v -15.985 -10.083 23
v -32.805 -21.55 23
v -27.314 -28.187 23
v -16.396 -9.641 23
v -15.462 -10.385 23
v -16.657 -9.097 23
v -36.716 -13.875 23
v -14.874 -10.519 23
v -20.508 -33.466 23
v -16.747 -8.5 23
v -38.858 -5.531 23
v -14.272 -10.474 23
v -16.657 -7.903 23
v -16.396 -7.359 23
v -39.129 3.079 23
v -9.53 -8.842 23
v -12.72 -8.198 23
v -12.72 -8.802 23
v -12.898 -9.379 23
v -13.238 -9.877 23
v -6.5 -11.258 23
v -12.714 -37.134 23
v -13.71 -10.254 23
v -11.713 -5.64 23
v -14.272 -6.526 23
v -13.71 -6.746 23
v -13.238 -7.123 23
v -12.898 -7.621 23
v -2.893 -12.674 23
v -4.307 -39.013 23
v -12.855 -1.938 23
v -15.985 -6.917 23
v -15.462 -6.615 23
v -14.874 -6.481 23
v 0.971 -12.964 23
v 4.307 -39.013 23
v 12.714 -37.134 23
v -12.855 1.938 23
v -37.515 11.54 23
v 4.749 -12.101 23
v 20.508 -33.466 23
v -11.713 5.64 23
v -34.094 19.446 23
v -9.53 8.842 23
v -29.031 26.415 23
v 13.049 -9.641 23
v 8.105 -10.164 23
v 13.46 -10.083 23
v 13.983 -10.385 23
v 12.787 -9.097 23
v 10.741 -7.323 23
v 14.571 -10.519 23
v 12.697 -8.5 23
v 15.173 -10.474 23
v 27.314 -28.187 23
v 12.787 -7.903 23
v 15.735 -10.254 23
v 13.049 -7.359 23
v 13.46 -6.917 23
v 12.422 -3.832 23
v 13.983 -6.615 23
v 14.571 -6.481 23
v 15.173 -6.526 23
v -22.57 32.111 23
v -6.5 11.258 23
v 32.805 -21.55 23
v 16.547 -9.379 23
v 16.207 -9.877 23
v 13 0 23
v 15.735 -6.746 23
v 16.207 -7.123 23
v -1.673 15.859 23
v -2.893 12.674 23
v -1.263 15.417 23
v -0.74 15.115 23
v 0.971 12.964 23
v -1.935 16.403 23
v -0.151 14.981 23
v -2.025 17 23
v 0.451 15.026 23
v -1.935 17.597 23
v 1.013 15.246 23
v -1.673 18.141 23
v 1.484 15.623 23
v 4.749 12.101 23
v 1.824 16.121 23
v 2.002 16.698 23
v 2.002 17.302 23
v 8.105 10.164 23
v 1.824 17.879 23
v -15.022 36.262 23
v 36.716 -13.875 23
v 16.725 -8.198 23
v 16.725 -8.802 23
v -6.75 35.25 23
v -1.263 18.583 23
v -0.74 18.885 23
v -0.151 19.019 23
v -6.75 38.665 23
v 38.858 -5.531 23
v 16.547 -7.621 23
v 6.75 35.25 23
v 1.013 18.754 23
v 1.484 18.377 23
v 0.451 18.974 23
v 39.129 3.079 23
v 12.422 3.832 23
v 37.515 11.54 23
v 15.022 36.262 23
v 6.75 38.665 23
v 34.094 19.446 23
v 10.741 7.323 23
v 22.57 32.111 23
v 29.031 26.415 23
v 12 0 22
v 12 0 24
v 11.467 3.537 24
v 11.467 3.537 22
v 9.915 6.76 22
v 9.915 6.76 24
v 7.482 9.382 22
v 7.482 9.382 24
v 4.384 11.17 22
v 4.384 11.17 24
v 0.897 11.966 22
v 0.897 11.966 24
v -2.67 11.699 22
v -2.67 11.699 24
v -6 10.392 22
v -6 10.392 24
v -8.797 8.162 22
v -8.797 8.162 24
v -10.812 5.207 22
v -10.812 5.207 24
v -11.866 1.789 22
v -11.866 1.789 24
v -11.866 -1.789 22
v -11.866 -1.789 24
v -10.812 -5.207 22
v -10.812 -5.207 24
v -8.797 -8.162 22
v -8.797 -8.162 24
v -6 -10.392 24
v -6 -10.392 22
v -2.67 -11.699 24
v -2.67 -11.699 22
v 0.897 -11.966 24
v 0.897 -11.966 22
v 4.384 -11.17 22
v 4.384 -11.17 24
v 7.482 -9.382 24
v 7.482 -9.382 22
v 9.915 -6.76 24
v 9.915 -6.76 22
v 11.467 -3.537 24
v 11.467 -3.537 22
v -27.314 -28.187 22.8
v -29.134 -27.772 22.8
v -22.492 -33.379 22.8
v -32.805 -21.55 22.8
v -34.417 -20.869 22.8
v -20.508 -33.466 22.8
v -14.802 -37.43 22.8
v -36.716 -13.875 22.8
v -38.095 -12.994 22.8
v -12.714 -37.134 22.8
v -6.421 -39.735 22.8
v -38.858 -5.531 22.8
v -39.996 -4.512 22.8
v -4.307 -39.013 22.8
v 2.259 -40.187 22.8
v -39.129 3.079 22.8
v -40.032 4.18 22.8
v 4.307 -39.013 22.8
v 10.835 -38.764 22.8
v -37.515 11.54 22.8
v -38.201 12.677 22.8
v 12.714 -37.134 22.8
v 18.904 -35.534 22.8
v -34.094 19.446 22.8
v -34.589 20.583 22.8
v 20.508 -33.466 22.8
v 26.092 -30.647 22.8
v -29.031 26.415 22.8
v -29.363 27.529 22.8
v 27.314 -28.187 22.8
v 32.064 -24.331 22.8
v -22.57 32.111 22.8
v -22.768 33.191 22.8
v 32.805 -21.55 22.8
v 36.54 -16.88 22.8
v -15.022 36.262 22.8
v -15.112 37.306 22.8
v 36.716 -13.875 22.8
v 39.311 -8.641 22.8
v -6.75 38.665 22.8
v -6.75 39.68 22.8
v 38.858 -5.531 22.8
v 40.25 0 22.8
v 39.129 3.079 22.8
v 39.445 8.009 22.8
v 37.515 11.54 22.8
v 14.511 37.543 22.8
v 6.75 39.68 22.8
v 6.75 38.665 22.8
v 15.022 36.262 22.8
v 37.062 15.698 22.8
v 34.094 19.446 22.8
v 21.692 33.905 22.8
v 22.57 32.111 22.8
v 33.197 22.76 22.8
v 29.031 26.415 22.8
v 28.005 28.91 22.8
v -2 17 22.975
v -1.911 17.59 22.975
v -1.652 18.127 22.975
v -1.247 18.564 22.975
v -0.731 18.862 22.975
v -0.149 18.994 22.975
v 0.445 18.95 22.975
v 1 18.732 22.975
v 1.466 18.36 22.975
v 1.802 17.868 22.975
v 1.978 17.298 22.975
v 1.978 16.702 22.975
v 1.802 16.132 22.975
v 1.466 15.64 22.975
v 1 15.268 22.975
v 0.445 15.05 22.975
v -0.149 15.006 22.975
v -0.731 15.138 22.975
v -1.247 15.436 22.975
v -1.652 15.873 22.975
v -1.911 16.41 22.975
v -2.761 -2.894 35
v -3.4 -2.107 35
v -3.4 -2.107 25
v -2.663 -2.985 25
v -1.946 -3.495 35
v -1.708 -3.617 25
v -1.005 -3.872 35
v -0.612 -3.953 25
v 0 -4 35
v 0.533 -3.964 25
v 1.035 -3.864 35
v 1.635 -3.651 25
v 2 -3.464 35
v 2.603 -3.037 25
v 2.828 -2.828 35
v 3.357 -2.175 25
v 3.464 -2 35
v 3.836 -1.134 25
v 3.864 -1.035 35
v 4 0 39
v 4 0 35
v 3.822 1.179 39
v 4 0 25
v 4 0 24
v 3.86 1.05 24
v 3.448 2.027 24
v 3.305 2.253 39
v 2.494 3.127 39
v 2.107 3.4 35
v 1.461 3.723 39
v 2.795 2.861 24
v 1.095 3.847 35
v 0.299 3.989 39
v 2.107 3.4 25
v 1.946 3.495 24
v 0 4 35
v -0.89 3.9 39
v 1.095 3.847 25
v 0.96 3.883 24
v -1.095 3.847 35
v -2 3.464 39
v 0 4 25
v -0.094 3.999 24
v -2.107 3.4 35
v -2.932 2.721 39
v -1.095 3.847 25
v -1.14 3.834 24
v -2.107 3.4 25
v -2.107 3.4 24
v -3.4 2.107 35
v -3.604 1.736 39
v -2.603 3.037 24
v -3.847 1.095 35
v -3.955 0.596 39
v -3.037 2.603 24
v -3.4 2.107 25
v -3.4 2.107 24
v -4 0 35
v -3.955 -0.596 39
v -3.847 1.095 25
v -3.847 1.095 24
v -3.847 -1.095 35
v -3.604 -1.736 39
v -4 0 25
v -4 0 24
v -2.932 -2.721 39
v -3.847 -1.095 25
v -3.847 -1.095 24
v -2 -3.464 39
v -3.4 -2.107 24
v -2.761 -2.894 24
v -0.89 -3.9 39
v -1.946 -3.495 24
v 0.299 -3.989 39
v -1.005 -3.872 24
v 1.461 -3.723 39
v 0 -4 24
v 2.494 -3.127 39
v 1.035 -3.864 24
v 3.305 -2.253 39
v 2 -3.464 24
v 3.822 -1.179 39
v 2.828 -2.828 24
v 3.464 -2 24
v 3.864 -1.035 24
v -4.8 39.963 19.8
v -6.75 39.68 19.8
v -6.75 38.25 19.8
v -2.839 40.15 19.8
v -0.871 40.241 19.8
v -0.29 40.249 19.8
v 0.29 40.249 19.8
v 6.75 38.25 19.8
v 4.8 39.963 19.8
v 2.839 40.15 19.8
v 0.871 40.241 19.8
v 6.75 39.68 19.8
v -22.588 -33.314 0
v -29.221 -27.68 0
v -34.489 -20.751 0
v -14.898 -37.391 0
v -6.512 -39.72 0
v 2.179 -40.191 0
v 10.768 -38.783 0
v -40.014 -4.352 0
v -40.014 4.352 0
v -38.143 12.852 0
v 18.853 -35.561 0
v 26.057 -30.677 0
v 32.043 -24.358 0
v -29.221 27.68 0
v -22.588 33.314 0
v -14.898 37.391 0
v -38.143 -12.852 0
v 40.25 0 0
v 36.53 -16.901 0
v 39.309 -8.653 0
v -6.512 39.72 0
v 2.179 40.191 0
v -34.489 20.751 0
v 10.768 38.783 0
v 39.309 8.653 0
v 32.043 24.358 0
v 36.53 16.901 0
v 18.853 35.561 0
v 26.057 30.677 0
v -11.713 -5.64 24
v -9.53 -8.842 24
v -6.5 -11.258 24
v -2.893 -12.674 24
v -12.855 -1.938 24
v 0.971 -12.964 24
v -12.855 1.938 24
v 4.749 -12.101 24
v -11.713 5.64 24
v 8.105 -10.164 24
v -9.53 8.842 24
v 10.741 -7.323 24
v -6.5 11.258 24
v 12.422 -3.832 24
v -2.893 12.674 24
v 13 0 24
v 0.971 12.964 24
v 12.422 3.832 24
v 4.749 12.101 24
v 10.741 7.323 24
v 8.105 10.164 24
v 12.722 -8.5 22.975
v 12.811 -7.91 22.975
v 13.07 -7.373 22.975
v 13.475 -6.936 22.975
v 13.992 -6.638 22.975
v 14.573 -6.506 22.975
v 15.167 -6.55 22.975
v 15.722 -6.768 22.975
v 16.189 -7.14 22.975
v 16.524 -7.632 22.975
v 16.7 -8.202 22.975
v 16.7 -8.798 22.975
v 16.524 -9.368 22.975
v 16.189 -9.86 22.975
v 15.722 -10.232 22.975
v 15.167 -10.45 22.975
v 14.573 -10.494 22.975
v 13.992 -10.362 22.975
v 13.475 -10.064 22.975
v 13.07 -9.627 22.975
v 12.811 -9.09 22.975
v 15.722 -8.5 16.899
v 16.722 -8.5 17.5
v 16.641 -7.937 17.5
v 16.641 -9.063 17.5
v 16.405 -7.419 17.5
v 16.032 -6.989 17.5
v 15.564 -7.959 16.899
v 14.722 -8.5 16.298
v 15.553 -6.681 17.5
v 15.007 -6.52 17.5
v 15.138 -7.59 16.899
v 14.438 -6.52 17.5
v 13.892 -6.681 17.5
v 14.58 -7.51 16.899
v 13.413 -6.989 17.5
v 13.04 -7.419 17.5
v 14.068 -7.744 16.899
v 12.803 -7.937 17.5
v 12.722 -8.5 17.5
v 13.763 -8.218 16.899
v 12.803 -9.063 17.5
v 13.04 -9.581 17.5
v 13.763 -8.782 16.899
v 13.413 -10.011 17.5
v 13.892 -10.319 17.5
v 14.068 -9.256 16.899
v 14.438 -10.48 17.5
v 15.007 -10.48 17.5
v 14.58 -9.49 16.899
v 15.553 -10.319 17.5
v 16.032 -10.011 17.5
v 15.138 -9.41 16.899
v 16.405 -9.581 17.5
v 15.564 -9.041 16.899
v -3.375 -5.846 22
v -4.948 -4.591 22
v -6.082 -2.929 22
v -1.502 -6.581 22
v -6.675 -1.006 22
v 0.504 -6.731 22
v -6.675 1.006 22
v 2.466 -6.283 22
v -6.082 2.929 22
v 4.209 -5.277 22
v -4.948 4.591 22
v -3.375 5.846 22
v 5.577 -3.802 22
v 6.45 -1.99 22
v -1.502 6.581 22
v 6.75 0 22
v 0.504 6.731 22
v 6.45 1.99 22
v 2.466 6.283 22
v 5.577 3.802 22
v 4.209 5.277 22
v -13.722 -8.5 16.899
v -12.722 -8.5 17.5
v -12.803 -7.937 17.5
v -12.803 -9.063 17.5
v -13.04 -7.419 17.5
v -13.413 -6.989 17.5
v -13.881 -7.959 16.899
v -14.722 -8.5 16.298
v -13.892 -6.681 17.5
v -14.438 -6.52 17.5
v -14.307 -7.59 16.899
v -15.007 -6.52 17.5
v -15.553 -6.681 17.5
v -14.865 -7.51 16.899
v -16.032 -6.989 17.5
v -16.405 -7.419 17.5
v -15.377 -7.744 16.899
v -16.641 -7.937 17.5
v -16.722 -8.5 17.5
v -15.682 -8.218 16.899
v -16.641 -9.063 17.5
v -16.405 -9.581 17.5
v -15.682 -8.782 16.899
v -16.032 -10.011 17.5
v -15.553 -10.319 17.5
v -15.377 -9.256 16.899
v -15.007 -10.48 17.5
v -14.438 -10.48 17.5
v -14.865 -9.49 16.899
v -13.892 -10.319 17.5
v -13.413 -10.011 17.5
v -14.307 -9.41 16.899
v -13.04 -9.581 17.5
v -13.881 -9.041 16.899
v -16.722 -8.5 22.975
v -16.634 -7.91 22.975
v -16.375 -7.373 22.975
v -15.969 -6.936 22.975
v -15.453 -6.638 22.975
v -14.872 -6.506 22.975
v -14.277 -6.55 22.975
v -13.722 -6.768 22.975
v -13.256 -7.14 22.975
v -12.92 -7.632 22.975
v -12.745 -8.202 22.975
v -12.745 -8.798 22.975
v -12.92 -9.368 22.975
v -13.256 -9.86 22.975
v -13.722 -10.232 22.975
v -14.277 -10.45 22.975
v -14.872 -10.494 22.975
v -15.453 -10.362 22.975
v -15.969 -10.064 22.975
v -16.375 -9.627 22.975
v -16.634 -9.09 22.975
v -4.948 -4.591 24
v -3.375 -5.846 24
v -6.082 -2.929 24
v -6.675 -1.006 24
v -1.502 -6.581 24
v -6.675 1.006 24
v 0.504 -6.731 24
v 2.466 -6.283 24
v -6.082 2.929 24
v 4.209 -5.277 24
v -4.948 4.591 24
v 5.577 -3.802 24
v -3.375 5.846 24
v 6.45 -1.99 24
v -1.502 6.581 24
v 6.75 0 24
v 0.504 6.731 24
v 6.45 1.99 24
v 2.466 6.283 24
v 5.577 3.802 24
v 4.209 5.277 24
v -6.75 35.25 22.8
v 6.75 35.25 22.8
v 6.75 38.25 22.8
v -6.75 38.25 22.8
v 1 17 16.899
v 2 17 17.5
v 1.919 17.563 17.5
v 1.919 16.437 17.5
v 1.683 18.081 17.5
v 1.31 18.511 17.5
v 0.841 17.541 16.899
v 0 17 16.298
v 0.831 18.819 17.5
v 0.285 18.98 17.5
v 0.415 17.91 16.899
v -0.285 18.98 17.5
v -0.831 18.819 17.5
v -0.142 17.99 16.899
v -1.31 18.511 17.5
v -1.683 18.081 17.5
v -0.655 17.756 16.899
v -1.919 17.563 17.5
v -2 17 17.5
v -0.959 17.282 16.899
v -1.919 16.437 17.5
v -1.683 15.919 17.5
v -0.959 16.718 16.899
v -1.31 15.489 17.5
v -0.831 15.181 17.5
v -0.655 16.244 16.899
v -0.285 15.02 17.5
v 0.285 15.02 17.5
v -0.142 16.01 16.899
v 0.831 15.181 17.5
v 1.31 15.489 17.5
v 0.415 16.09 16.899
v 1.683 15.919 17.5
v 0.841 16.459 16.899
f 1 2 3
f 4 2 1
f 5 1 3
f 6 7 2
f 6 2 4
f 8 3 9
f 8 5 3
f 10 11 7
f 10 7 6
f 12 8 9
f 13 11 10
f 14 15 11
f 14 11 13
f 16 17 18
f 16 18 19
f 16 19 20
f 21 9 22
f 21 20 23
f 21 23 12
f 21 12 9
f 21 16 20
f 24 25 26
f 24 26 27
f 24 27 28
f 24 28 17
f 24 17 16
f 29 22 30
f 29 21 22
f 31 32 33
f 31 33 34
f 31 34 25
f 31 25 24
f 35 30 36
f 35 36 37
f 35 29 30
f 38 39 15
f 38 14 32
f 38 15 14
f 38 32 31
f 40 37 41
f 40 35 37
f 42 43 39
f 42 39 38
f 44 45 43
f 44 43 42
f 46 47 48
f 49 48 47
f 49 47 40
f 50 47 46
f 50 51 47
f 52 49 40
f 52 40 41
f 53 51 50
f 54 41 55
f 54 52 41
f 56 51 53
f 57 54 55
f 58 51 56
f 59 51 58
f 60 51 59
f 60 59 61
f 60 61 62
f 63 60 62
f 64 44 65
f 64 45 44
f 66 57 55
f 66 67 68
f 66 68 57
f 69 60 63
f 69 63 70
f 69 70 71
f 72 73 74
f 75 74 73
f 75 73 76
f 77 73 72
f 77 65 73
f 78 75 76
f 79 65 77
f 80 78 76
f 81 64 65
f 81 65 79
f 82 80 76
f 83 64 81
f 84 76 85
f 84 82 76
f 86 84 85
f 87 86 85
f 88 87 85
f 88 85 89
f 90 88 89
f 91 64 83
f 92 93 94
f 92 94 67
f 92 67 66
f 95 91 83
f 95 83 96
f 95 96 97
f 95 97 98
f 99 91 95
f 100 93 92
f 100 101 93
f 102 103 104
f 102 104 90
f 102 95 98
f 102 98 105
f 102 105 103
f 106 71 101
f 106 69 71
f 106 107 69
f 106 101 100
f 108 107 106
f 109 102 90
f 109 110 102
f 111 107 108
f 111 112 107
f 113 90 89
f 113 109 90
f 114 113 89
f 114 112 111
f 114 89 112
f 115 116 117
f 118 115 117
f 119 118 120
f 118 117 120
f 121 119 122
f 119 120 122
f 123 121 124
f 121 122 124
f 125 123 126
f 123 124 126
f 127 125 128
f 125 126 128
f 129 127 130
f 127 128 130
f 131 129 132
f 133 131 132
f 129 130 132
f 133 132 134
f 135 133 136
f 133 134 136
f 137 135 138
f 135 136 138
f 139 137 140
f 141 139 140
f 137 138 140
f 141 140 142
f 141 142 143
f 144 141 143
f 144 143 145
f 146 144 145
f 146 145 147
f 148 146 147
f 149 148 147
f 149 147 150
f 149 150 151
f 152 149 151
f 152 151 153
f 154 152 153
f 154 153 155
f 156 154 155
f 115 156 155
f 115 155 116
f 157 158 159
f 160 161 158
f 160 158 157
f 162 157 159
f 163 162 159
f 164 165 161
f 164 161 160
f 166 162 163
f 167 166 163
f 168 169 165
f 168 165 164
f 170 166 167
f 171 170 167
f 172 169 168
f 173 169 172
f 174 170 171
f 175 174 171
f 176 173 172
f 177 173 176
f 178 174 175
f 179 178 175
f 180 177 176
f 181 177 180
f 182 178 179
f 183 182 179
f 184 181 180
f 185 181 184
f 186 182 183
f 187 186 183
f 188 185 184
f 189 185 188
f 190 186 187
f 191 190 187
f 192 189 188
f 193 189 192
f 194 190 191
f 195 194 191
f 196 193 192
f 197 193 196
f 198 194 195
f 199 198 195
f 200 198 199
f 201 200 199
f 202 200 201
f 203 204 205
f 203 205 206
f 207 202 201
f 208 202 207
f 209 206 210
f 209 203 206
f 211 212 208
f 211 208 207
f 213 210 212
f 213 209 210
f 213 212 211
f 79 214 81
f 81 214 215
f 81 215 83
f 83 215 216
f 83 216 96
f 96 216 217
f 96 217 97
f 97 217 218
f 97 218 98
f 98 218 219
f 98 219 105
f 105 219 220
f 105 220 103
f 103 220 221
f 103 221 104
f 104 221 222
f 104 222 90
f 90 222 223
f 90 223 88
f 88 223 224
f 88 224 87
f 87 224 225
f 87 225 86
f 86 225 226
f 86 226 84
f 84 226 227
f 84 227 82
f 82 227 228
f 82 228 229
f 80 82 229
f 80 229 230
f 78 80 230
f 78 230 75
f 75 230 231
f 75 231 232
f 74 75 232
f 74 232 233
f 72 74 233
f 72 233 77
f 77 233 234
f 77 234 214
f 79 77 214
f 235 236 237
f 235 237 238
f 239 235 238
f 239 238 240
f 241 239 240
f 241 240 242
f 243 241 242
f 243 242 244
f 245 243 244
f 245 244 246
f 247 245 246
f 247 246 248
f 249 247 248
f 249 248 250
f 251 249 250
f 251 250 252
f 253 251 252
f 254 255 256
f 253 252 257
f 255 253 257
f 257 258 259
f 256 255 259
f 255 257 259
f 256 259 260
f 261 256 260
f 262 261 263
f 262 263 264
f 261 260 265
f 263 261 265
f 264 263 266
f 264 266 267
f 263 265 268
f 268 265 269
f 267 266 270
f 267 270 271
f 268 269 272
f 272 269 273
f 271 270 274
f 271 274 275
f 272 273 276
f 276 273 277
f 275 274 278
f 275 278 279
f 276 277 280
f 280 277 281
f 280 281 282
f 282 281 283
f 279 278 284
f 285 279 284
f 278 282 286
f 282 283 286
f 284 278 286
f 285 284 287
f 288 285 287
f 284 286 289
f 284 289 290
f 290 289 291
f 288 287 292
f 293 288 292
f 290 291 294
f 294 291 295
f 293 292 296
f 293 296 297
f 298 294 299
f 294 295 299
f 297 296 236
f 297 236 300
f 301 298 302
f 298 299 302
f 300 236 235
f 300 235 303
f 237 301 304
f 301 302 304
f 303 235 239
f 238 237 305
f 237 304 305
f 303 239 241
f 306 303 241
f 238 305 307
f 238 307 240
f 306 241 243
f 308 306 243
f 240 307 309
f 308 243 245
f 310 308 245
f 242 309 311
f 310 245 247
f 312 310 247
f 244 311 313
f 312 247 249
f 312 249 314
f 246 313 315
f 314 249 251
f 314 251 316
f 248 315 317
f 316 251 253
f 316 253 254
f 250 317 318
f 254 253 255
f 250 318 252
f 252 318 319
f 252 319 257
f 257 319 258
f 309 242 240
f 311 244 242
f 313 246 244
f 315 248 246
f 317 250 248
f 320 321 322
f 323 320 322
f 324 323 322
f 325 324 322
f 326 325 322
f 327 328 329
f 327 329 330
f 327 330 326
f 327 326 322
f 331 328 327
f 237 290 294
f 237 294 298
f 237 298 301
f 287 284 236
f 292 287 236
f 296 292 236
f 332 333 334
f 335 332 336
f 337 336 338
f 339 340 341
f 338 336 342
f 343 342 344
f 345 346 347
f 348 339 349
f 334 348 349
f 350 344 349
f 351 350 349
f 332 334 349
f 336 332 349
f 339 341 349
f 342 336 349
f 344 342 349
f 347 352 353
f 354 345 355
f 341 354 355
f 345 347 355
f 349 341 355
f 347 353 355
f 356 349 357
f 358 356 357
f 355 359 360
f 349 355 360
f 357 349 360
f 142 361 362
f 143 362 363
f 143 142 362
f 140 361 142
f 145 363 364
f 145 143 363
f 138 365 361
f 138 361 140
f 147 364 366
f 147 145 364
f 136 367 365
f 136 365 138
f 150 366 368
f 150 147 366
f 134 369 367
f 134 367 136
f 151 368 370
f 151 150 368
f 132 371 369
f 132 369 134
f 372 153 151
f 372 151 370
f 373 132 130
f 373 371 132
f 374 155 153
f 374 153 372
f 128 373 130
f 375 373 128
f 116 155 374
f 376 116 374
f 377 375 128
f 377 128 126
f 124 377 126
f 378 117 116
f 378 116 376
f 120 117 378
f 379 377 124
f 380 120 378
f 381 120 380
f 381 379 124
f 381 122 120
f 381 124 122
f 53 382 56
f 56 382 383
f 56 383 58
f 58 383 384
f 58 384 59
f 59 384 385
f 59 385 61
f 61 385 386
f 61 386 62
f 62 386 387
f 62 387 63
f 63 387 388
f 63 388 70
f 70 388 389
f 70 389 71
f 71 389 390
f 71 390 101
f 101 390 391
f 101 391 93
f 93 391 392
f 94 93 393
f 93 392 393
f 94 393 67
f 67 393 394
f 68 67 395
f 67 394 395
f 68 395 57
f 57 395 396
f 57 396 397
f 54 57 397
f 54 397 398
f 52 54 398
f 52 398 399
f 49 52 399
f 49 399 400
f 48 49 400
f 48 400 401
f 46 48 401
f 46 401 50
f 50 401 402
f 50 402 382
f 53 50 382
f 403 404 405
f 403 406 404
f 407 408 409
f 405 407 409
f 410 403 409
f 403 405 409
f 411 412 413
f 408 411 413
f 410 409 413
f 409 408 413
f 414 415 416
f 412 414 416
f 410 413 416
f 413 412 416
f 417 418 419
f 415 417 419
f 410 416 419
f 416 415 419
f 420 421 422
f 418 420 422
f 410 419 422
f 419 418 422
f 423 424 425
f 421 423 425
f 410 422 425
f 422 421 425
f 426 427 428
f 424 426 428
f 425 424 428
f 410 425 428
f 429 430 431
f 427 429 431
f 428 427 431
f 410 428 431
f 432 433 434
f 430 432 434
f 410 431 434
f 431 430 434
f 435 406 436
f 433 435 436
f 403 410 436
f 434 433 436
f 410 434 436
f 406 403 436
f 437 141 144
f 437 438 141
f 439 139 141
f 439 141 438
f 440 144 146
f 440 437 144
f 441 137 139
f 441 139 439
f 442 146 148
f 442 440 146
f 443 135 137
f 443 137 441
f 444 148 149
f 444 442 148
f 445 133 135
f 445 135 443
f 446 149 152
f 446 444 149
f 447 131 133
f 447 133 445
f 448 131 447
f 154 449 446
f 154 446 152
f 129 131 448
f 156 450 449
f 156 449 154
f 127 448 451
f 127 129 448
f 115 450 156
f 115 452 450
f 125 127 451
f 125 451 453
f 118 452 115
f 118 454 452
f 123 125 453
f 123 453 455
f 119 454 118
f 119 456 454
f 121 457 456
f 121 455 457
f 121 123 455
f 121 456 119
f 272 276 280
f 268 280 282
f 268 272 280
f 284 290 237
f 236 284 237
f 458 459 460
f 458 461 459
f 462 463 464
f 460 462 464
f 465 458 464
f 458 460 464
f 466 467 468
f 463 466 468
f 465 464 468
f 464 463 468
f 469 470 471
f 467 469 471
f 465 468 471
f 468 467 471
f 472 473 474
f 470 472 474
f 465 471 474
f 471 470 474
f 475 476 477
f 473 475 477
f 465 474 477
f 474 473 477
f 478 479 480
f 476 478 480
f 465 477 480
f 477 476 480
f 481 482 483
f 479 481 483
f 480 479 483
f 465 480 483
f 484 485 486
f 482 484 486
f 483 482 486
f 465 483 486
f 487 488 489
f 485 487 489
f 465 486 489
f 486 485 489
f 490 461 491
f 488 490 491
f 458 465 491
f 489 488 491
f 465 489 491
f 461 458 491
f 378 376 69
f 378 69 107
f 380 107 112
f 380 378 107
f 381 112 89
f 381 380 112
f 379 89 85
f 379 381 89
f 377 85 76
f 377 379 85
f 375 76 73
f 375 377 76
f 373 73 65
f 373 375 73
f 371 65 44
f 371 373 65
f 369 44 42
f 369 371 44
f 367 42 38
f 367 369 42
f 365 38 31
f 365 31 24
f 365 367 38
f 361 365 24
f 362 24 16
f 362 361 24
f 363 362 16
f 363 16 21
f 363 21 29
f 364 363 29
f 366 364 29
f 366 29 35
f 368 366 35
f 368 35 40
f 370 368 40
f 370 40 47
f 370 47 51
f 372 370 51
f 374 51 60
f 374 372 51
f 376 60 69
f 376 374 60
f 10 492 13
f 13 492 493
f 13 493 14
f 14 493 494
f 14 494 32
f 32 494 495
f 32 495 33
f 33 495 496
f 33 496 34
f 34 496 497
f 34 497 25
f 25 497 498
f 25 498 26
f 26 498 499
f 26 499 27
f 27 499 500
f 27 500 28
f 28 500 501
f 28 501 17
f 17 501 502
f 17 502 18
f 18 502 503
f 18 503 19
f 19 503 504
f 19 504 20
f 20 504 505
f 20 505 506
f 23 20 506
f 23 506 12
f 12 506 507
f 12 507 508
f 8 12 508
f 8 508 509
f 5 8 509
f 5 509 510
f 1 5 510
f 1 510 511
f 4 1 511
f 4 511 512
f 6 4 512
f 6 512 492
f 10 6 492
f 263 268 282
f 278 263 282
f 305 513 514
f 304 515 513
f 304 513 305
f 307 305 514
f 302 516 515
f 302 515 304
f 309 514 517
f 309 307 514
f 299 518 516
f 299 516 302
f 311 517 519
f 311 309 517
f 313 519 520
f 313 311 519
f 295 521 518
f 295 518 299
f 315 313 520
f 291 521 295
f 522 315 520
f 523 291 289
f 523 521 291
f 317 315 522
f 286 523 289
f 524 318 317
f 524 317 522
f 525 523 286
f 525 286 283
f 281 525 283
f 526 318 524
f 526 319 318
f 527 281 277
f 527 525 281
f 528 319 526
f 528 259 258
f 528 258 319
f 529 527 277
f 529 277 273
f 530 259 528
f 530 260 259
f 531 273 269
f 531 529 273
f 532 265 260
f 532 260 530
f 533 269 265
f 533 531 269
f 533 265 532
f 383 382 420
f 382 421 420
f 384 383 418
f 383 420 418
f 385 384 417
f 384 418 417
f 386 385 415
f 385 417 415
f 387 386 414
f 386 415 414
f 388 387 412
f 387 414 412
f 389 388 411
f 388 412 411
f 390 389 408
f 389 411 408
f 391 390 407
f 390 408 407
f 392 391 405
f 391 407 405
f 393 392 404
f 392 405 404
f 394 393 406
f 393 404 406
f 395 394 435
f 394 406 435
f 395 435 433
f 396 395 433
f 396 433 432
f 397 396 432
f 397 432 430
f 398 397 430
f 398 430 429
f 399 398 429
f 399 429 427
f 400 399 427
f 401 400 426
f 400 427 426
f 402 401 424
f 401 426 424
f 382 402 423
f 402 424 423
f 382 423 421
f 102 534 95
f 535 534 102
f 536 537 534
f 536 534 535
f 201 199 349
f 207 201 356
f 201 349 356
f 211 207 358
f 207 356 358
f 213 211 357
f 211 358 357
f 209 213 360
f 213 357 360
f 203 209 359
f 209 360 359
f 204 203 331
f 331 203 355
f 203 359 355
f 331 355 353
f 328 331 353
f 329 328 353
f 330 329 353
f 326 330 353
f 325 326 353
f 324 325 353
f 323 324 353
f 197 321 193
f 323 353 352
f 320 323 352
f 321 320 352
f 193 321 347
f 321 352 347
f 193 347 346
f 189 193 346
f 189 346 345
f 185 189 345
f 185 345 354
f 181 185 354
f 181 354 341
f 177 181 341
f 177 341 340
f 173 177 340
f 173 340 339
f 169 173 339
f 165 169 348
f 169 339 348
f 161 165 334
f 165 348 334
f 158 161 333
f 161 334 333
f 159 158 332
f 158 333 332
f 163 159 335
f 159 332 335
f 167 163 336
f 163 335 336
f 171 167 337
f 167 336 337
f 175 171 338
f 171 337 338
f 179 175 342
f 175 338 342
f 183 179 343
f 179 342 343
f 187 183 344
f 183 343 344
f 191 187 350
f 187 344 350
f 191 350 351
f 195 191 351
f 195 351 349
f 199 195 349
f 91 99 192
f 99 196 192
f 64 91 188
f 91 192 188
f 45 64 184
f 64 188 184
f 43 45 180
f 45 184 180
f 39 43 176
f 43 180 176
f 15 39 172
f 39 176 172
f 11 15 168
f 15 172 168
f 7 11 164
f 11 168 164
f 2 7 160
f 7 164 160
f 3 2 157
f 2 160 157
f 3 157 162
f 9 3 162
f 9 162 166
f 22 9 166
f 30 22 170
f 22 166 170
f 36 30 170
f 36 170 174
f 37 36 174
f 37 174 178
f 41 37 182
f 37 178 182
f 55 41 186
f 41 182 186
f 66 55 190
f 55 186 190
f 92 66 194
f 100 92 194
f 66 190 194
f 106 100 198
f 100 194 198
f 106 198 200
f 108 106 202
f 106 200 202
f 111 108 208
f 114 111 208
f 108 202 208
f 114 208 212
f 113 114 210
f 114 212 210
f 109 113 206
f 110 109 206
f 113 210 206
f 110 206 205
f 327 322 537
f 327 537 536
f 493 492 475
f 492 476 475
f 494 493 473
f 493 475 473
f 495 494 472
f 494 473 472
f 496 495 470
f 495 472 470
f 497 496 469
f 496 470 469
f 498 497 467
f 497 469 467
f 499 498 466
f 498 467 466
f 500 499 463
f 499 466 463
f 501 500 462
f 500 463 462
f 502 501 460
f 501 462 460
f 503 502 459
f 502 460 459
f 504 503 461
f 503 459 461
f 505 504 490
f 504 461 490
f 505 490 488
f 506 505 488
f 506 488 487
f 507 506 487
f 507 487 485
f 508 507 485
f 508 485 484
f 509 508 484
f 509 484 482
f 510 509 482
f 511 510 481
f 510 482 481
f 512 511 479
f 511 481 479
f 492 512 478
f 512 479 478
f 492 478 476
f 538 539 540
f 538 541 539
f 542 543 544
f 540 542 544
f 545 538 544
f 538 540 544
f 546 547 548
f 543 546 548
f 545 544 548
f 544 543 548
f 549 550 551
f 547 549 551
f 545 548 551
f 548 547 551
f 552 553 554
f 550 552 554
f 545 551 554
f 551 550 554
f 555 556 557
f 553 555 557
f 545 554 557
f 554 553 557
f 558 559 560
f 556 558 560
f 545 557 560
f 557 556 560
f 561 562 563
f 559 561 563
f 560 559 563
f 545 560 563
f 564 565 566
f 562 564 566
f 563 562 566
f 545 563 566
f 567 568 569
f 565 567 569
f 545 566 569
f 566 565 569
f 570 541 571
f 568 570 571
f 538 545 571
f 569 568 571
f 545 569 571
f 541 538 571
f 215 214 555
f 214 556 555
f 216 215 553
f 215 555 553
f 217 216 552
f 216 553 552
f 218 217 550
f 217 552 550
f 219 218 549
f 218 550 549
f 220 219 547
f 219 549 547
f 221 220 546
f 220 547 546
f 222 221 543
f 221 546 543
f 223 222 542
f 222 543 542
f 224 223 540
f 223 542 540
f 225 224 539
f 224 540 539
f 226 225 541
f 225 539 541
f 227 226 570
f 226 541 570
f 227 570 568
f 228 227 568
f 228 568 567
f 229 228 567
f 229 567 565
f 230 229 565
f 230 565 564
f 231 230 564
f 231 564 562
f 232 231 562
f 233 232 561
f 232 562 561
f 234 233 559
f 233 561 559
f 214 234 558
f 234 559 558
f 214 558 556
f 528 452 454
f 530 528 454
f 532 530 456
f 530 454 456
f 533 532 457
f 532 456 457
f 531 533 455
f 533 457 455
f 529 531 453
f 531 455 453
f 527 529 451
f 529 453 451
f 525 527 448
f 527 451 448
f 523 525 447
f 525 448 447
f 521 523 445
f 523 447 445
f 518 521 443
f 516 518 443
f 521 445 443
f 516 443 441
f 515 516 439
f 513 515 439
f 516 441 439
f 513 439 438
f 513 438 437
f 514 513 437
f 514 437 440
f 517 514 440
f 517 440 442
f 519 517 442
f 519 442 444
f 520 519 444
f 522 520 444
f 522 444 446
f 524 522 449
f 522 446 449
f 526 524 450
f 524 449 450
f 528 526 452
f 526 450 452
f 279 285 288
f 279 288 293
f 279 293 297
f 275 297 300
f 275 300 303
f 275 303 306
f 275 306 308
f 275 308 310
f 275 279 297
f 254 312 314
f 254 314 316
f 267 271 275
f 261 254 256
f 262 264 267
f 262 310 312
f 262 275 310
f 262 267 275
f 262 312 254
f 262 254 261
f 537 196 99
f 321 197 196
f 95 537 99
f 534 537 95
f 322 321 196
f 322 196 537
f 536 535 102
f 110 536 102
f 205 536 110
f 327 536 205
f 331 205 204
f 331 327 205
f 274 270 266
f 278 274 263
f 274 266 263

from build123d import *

# Parameters (mm, degrees)
SKETCH1_R                       = 40.25
BOSS_EXTRUDE1_DEPTH             = 23
SKETCH2_R                       = 12
CUT_EXTRUDE1_DEPTH              = 1
BOSS_EXTRUDE2_START             = 1
SKETCH3_R                       = 13
SKETCH3_R_2                     = 12
BOSS_EXTRUDE2_DEPTH             = 1
SKETCH4_R                       = 6.75
BOSS_EXTRUDE3_DEPTH             = 2
SKETCH7_R                       = 4
BOSS_EXTRUDE5_DEPTH             = 1
BOSS_EXTRUDE6_DEPTH             = 11
SKETCH8_R                       = 4
BOSS_EXTRUDE7_DEPTH             = 4
CUT_EXTRUDE2_START              = -0.2
SKETCH9_R                       = 40.25
SKETCH9_R_2                     = 39.25
CUT_EXTRUDE2_DEPTH              = 0.2
CUT_EXTRUDE4_START              = -0.2
CUT_EXTRUDE4_DEPTH              = 0.2
CUT_EXTRUDE5_START              = -3
CUT_EXTRUDE5_DEPTH              = 3
F_4_0MM_DOWEL_HOLE1_D           = 4
F_4_0MM_DOWEL_HOLE1_DEPTH       = 5.5
F_4_0MM_DOWEL_HOLE1_CSINK_D     = 4.05
F_4_0MM_DOWEL_HOLE1_CSINK_ANGLE = 90
F_4_0MM_DOWEL_HOLE1_TIP         = 1.201721238


with BuildPart() as part:
    # Sketch1 → Boss-Extrude1 (new body)
    with BuildSketch(Plane.XY):
        Circle(SKETCH1_R)
    extrude(amount=BOSS_EXTRUDE1_DEPTH)

    # Sketch2 → Cut-Extrude1 (cut)
    with BuildSketch(Plane.XY.offset(23)):
        Circle(SKETCH2_R)
    extrude(amount=-CUT_EXTRUDE1_DEPTH, mode=Mode.SUBTRACT)

    # Sketch3 → Boss-Extrude2 (add)
    with BuildSketch(Plane.XY.offset(23).offset(BOSS_EXTRUDE2_START)):
        Circle(SKETCH3_R)
        Circle(SKETCH3_R_2, mode=Mode.SUBTRACT)
    extrude(amount=-BOSS_EXTRUDE2_DEPTH)

    # Sketch4 → Boss-Extrude3 (add)
    with BuildSketch(Plane.XY.offset(22)):
        Circle(SKETCH4_R)
    extrude(amount=BOSS_EXTRUDE3_DEPTH)

    # Sketch7 → Boss-Extrude5 (add)
    with BuildSketch(Plane.XY.offset(24)):
        Circle(SKETCH7_R)
    extrude(amount=BOSS_EXTRUDE5_DEPTH)

    # Sketch5 → Boss-Extrude6 (add)
    with BuildSketch(Plane.XY.offset(24)):
        with BuildLine():
            Line((0, 0), (0, -4))
            ThreePointArc((0, -4), (2.828427125, -2.828427125), (4, 0))
            Line((4, 0), (0, 0))
        make_face()
        with BuildLine():
            Line((0, 3.4), (0, 0))
            Line((0, 0), (4, 0))
            ThreePointArc((4, 0), (3.494890771, 1.945697433), (2.107130751, 3.4))
            Line((2.107130751, 3.4), (0, 3.4))
        make_face()
        with BuildLine():
            Line((-3.4, 0), (0, 0))
            Line((0, 0), (0, 3.4))
            Line((0, 3.4), (-2.107130751, 3.4))
            ThreePointArc((-2.107130751, 3.4), (-2.828427125, 2.828427125), (-3.4, 2.107130751))
            Line((-3.4, 2.107130751), (-3.4, 0))
        make_face()
        with BuildLine():
            ThreePointArc((-3.4, -2.107130751), (-1.945697433, -3.494890771), (0, -4))
            Line((0, -4), (0, 0))
            Line((0, 0), (-3.4, 0))
            Line((-3.4, 0), (-3.4, -2.107130751))
        make_face()
    extrude(amount=BOSS_EXTRUDE6_DEPTH)

    # Sketch8 → Boss-Extrude7 (add)
    with BuildSketch(Plane.XY.offset(35)):
        Circle(SKETCH8_R)
    extrude(amount=BOSS_EXTRUDE7_DEPTH)

    # Sketch9 → Cut-Extrude2 (cut)
    with BuildSketch(Plane.XY.offset(23).offset(CUT_EXTRUDE2_START)):
        Circle(SKETCH9_R)
        Circle(SKETCH9_R_2, mode=Mode.SUBTRACT)
    extrude(amount=CUT_EXTRUDE2_DEPTH, mode=Mode.SUBTRACT)

    # Sketch11 → Cut-Extrude4 (cut)
    with BuildSketch(Plane.XY.offset(23).offset(CUT_EXTRUDE4_START)):
        with BuildLine():
            ThreePointArc((6.75, 38.665229858), (3.387641367, 39.103534188), (0, 39.25))
            Line((0, 39.25), (0, 35.25))
            Line((0, 35.25), (6.75, 35.25))
            Line((6.75, 35.25), (6.75, 38.665229858))
        make_face()
        with BuildLine():
            Line((0, 35.25), (0, 39.25))
            ThreePointArc((0, 39.25), (-3.387641367, 39.103534188), (-6.75, 38.665229858))
            Line((-6.75, 38.665229858), (-6.75, 35.25))
            Line((-6.75, 35.25), (0, 35.25))
        make_face()
    extrude(amount=CUT_EXTRUDE4_DEPTH, mode=Mode.SUBTRACT)

    # Sketch12 → Cut-Extrude5 (cut)
    with BuildSketch(Plane.XY.offset(22.8).offset(CUT_EXTRUDE5_START)):
        with BuildLine():
            Line((-6.75, 38.25), (6.75, 38.25))
            Line((6.75, 38.25), (6.75, 38.665229858))
            Line((6.75, 38.665229858), (6.75, 39.679969758))
            ThreePointArc((6.75, 39.679969758), (3.820610596, 40.068259691), (0.870628209, 40.24058283))
            Line((0.870628209, 40.24058283), (-0.870628209, 40.24058283))
            ThreePointArc((-0.870628209, 40.24058283), (-3.820610596, 40.068259691), (-6.75, 39.679969758))
            Line((-6.75, 39.679969758), (-6.75, 38.665229858))
            Line((-6.75, 38.665229858), (-6.75, 38.25))
        make_face()
        with BuildLine():
            Line((-0.870628209, 40.24058283), (0.870628209, 40.24058283))
            ThreePointArc((0.870628209, 40.24058283), (0, 40.25), (-0.870628209, 40.24058283))
        make_face()
    extrude(amount=CUT_EXTRUDE5_DEPTH, mode=Mode.SUBTRACT)

    # Ø4.0mm Dowel Hole1
    with Locations(Plane.XY.offset(23)):
        with Locations((0, 17), (14.722431864, -8.5), (-14.722431864, -8.5)):
            CounterSinkHole(F_4_0MM_DOWEL_HOLE1_D / 2, F_4_0MM_DOWEL_HOLE1_CSINK_D / 2, depth=F_4_0MM_DOWEL_HOLE1_DEPTH, counter_sink_angle=F_4_0MM_DOWEL_HOLE1_CSINK_ANGLE)
            with Locations((0, 0, -(F_4_0MM_DOWEL_HOLE1_DEPTH + F_4_0MM_DOWEL_HOLE1_TIP / 2))):  # 118° drill point
                Cone(0, F_4_0MM_DOWEL_HOLE1_D / 2, F_4_0MM_DOWEL_HOLE1_TIP, mode=Mode.SUBTRACT)


solid = part.part
